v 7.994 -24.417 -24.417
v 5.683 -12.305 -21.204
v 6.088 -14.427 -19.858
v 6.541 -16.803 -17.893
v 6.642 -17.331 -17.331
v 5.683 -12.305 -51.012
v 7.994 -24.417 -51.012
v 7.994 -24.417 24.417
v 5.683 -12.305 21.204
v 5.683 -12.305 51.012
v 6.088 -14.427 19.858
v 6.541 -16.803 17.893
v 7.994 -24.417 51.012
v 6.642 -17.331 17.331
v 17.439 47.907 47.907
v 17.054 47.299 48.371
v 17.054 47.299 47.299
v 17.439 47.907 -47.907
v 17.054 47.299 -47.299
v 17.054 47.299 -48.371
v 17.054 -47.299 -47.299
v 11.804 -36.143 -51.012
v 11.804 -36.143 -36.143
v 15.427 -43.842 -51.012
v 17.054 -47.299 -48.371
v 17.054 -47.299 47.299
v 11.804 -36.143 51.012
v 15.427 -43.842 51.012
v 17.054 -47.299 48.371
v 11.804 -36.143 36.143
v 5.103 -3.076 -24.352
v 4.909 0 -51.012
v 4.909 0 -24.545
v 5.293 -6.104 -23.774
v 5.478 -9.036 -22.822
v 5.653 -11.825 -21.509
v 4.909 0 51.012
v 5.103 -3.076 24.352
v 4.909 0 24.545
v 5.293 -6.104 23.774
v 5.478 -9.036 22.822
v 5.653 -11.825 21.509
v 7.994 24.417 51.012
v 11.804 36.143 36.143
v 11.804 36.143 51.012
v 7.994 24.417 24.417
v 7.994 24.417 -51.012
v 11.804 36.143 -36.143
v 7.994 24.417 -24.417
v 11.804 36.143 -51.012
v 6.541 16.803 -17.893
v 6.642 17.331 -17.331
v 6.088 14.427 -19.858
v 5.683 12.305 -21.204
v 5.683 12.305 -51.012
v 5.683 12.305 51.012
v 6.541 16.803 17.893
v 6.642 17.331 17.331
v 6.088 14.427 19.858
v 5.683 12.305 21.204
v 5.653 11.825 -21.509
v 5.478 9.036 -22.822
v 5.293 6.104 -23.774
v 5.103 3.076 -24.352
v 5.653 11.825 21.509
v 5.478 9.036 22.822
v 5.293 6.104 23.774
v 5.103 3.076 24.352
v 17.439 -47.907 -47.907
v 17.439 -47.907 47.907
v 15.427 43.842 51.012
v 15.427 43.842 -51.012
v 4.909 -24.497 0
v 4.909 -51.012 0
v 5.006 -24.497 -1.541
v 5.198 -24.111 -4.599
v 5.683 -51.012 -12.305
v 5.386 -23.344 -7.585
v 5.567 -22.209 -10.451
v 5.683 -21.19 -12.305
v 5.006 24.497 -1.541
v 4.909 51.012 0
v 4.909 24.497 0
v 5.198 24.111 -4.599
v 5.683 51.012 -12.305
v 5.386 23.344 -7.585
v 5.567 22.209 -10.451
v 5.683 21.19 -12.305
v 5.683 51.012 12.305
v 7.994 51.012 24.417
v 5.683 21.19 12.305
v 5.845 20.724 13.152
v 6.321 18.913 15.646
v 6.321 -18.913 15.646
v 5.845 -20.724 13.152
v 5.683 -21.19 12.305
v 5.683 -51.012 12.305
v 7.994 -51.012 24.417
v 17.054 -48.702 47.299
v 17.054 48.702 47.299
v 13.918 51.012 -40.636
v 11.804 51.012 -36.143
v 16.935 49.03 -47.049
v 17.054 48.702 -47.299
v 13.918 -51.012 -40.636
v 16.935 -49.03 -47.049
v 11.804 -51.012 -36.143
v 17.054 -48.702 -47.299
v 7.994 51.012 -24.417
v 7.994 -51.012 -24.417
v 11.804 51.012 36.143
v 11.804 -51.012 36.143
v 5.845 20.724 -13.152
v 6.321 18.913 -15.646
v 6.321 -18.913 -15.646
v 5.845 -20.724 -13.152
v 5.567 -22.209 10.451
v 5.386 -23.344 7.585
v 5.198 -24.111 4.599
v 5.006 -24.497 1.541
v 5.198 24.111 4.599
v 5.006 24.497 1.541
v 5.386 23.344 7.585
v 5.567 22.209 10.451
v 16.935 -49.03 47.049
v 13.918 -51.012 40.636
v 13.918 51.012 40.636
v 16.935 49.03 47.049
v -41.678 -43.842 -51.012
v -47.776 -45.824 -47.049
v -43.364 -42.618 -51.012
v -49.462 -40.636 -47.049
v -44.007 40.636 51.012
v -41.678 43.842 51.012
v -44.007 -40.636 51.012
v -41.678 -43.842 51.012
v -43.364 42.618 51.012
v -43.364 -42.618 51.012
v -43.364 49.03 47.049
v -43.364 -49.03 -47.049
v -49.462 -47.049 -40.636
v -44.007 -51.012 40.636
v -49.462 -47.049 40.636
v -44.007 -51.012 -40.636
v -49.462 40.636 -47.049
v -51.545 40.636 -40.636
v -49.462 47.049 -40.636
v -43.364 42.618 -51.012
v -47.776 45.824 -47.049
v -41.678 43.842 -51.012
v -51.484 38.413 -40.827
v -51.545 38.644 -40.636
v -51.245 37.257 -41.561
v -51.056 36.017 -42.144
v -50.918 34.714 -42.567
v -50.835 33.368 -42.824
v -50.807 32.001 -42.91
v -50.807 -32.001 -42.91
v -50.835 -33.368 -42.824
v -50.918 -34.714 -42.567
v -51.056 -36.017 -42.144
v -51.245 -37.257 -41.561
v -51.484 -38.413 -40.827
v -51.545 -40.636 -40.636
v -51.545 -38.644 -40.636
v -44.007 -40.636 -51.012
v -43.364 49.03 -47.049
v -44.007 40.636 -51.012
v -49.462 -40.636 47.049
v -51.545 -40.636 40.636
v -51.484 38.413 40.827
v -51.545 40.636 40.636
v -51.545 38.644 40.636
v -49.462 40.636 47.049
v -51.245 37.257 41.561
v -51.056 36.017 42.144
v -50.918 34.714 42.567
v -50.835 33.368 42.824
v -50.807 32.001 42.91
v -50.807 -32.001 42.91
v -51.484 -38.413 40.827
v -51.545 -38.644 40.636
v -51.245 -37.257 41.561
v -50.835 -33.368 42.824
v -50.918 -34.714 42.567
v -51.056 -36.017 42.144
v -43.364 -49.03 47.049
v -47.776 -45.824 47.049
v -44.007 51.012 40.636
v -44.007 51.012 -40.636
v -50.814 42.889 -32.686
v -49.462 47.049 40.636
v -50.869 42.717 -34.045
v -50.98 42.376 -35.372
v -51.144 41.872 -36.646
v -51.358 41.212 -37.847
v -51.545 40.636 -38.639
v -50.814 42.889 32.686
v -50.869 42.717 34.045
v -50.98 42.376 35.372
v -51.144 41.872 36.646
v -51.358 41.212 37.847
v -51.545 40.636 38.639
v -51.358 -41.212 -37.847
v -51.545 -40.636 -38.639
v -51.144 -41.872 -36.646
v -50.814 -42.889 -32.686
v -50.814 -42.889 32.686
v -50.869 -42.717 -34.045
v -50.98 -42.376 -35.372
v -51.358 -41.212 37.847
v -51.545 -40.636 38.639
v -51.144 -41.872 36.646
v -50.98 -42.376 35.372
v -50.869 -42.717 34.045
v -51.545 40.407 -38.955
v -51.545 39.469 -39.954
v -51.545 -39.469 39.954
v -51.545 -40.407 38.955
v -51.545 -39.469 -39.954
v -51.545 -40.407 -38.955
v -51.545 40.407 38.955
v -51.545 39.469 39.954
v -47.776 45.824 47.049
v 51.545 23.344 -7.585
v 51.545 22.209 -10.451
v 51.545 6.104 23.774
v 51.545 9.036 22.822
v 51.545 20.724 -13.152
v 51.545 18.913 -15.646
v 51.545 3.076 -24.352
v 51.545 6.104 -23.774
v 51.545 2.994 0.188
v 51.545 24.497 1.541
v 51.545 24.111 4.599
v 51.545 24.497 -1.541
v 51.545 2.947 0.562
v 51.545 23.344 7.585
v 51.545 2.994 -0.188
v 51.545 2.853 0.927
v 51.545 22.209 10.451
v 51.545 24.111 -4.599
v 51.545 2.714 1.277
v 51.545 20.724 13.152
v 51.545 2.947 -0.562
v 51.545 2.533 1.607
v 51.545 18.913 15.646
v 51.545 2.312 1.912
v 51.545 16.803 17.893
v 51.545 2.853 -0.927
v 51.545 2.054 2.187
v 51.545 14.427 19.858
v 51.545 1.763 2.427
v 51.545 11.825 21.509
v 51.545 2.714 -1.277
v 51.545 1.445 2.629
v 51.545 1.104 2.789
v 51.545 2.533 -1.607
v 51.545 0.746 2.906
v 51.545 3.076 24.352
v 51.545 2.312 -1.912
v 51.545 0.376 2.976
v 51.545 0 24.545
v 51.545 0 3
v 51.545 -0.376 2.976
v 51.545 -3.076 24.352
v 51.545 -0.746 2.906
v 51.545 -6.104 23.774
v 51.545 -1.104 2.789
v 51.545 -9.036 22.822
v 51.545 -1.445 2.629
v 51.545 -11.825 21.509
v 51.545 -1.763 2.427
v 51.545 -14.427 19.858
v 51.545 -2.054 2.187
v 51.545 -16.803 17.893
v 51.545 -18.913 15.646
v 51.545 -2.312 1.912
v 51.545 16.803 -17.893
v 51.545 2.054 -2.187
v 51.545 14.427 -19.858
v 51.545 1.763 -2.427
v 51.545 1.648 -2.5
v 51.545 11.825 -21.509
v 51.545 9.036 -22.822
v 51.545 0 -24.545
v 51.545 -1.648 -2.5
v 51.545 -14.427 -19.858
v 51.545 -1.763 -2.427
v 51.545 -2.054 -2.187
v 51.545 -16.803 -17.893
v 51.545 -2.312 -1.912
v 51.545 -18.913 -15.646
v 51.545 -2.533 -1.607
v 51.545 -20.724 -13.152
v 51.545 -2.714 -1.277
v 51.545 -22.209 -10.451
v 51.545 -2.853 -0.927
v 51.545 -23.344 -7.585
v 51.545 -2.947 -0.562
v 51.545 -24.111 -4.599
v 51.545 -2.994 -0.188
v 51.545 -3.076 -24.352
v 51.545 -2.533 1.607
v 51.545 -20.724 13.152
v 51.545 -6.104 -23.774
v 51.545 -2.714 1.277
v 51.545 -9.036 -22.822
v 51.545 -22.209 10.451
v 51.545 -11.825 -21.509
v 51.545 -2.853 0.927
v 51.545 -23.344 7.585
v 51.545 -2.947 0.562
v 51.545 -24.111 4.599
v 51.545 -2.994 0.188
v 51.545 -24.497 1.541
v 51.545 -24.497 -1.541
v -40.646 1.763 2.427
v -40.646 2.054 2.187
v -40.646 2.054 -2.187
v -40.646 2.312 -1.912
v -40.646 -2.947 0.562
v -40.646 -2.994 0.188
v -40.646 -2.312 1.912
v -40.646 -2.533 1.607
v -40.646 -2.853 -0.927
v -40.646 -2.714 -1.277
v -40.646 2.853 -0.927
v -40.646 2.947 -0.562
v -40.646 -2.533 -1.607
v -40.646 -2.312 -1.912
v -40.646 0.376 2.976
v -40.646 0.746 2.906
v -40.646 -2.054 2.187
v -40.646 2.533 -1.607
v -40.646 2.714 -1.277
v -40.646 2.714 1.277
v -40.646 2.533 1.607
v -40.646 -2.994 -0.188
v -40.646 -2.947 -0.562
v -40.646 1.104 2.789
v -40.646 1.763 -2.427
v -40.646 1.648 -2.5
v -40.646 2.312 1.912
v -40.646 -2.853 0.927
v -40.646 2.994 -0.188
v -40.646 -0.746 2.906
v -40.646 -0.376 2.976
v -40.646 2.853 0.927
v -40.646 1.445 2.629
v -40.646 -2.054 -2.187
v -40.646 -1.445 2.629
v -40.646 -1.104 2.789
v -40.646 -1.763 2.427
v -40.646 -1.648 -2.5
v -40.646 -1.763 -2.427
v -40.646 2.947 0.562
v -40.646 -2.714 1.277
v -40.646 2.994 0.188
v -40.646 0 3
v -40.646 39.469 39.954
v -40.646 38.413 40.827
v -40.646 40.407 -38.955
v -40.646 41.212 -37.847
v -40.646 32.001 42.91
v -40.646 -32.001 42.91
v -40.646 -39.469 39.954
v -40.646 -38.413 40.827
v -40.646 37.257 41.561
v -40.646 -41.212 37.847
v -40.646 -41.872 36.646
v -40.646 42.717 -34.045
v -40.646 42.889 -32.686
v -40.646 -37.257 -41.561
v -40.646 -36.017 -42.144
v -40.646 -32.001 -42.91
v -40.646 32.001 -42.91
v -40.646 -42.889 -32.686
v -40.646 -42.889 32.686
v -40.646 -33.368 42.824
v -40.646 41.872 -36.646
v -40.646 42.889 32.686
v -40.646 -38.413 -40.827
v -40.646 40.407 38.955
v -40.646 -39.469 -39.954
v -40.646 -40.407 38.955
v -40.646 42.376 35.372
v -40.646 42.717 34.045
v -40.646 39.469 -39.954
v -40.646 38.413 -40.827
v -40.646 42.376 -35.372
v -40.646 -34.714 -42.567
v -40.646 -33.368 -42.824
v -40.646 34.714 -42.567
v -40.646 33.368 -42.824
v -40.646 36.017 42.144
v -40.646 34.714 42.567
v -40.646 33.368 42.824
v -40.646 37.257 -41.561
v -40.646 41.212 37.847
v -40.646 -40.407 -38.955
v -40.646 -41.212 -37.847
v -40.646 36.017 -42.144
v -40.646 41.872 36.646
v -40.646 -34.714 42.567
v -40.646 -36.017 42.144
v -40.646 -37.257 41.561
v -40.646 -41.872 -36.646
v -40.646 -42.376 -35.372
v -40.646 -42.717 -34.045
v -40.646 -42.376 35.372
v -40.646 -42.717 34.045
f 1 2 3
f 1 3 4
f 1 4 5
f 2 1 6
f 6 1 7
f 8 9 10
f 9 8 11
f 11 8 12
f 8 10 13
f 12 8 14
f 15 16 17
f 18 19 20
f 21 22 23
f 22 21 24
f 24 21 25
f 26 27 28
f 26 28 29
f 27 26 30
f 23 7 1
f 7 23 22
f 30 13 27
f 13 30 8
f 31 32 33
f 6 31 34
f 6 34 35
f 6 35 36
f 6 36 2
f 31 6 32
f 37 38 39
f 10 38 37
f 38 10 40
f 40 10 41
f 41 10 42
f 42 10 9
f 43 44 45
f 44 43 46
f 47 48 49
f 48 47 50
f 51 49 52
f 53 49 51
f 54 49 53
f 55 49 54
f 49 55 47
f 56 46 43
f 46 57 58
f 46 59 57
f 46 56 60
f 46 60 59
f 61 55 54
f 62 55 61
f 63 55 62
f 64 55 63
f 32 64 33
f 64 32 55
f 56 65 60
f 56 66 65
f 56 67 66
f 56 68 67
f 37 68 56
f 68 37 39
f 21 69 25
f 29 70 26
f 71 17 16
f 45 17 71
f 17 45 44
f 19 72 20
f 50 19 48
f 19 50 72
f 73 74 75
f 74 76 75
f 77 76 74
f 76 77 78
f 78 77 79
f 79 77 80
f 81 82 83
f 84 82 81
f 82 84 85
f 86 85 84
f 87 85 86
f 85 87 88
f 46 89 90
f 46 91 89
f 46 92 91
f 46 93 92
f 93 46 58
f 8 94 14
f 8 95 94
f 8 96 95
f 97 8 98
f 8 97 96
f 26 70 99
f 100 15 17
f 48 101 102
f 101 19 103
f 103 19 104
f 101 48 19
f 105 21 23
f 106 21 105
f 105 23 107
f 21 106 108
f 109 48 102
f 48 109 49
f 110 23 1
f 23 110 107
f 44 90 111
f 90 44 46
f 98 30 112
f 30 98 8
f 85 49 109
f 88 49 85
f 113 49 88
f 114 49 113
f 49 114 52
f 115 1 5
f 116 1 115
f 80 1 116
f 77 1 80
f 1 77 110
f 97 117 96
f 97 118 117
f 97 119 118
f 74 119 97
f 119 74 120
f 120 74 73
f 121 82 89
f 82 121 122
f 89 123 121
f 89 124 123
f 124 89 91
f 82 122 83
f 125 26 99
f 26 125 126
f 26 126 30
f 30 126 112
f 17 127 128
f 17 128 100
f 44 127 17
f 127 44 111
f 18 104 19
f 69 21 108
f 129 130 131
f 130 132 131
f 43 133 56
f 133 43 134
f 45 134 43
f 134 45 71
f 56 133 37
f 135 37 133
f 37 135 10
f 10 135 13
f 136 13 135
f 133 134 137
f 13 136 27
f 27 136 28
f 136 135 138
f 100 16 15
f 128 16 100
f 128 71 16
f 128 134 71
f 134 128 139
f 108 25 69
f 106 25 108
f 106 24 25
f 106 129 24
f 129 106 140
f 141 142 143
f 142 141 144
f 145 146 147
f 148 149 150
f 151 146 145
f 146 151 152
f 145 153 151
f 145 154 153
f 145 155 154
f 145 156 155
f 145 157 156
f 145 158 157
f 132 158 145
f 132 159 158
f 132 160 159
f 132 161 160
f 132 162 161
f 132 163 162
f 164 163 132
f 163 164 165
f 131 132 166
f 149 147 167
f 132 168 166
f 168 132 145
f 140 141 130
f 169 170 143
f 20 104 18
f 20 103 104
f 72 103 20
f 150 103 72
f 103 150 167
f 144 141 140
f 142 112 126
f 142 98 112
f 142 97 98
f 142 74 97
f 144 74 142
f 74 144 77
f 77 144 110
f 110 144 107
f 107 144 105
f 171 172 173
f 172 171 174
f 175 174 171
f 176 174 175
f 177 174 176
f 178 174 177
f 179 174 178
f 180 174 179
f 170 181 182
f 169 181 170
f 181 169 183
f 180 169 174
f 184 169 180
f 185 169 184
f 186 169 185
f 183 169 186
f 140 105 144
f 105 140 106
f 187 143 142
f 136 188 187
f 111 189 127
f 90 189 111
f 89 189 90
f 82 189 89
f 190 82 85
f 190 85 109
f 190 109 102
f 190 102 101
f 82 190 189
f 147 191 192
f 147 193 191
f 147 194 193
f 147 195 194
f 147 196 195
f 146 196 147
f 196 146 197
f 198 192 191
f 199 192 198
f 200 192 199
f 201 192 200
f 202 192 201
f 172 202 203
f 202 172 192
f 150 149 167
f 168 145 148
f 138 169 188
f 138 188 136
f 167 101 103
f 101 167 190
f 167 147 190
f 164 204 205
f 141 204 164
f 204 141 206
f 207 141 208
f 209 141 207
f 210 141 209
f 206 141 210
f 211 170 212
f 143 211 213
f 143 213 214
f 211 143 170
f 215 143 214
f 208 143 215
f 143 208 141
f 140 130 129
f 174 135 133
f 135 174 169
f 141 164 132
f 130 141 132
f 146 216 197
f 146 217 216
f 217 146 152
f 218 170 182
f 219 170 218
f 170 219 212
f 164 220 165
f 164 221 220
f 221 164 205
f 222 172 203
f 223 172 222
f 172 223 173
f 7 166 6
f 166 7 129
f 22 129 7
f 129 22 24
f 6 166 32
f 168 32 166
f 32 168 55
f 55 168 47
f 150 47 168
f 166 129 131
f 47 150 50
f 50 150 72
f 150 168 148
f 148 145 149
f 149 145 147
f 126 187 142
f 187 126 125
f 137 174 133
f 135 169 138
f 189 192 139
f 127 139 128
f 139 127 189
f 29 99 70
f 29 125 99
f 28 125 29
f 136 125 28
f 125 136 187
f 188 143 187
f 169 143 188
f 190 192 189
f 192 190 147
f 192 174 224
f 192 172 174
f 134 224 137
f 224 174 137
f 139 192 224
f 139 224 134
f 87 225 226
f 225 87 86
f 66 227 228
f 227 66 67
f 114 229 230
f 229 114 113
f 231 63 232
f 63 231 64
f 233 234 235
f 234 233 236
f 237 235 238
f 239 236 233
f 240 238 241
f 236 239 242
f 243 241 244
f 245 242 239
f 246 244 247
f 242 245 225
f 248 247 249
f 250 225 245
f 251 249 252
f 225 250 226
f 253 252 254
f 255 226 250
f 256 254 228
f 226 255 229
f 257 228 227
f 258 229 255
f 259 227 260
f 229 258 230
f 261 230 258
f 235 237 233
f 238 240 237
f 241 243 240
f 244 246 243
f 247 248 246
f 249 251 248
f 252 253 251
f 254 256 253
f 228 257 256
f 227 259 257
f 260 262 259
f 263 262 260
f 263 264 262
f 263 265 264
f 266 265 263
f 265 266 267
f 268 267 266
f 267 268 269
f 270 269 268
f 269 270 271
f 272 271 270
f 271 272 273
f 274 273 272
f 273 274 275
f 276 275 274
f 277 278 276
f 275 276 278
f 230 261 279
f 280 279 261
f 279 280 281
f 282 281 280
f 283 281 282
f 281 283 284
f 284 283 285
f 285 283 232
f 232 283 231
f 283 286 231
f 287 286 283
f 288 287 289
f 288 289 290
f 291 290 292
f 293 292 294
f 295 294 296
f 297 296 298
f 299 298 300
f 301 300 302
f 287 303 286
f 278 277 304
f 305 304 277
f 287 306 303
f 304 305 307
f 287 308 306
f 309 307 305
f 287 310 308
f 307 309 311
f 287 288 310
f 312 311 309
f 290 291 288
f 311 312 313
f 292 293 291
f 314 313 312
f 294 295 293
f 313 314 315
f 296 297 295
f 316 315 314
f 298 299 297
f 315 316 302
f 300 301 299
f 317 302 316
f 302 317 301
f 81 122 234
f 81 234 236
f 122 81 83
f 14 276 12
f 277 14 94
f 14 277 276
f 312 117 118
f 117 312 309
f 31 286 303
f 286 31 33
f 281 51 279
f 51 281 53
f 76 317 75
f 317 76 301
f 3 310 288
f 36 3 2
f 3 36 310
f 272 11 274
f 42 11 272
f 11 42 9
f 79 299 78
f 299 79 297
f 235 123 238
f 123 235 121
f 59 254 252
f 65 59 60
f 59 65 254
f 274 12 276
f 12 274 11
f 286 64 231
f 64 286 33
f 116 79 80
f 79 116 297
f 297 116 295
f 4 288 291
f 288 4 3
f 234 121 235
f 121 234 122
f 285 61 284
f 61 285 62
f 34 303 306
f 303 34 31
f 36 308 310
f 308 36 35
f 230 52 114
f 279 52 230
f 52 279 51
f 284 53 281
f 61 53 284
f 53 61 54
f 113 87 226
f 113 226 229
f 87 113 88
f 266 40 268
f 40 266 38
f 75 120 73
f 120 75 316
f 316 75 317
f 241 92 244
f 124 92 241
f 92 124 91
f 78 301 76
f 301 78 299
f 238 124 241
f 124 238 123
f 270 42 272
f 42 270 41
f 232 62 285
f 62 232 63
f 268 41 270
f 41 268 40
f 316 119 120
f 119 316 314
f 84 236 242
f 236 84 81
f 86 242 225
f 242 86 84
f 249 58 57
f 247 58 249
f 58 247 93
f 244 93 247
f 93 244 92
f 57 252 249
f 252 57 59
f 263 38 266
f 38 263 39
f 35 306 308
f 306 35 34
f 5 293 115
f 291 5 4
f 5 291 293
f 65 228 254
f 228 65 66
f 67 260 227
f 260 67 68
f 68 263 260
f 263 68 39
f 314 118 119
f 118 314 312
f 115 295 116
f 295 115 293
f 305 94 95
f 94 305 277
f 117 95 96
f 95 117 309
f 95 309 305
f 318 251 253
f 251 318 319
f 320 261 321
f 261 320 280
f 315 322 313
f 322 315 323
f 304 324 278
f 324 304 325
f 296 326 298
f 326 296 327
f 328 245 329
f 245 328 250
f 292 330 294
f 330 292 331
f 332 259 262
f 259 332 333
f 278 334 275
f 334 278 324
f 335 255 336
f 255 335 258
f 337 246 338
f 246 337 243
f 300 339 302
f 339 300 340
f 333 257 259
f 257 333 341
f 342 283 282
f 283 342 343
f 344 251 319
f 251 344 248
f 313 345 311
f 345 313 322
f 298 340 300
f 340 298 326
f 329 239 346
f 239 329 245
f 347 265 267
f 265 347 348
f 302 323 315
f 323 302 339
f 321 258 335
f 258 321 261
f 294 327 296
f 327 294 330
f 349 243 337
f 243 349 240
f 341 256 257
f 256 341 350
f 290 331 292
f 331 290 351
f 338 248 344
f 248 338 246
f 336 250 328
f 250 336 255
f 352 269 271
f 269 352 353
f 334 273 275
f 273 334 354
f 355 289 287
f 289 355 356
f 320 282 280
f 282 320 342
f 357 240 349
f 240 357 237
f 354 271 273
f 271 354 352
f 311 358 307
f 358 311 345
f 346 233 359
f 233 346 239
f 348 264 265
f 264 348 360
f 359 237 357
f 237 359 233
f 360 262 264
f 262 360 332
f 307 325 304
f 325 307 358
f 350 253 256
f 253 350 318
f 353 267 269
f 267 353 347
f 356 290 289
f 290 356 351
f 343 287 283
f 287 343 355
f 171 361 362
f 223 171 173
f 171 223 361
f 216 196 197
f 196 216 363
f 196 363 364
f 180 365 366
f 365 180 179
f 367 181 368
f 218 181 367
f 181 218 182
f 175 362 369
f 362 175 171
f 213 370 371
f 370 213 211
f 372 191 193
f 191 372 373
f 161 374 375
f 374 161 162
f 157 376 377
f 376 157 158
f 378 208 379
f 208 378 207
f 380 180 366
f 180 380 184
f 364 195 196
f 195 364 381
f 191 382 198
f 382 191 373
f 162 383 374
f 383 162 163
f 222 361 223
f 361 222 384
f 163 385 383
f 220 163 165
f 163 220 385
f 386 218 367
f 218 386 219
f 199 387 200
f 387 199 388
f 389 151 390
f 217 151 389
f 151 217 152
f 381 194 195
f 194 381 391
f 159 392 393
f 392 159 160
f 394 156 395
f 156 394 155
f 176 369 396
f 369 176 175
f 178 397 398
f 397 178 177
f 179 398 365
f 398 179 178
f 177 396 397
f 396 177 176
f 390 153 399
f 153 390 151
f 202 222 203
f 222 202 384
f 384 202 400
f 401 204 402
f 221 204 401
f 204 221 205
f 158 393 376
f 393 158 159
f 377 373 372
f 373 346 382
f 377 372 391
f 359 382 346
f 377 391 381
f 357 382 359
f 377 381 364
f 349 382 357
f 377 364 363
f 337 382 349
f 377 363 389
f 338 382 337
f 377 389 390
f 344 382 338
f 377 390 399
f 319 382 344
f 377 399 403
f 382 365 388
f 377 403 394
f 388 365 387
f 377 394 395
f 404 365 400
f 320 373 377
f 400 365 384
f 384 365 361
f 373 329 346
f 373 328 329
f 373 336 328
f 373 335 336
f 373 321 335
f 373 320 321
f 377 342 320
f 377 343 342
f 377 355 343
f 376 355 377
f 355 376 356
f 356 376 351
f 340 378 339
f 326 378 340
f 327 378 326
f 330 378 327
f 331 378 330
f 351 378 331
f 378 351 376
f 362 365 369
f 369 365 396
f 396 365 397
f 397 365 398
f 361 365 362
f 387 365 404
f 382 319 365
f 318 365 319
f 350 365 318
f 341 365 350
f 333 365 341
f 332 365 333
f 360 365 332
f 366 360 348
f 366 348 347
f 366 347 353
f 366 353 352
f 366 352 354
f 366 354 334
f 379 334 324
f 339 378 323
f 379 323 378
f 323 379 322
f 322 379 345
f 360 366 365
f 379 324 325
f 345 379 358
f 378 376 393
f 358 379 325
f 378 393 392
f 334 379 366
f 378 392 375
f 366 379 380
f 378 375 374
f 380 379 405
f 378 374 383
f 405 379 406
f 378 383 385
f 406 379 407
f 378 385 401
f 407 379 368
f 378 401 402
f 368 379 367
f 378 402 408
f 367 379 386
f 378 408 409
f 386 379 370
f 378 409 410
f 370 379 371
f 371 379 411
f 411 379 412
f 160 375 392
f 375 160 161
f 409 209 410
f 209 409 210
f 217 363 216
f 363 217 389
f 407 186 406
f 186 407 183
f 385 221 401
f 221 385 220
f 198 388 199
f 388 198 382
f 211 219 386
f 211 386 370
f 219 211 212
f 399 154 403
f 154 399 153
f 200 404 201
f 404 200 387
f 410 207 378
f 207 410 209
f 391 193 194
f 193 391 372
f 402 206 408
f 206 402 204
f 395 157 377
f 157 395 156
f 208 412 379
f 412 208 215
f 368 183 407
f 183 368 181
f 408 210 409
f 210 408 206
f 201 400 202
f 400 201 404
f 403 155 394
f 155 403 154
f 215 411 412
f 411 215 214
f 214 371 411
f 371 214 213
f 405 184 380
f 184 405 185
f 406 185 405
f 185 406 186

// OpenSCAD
// file: variables.scad
$fn=50;

scale_factor = 300/55;

CUBIE=18.9*scale_factor; //total side length of each cube piece (including rounded edges)
CORE=18*scale_factor;
SCREW_TIP=1.5*scale_factor;
SCREW_BODY=2*scale_factor;
SCREW_HEAD=3.8*scale_factor;
INNER=4.5*scale_factor;
SPRING=3.2*scale_factor;
ROUND=2*scale_factor; //radius of rounded edges
DEPTH=6*scale_factor;
RAFT=5*scale_factor;
LAYER=0.3*scale_factor;
GAP=0.25*scale_factor;

core_height = 20 * scale_factor;
core_radius = 3 * scale_factor;

WITH_SUPPORT=false;
WITH_RAFT=false;

inner_cubie=(CUBIE-2*ROUND); //length of each cube before rounded edges

tile_length = inner_cubie*0.75;
tile_height = 1 * scale_factor;

module tile(length, height) {
	translate([-length/2,-length/2,0]) {
		minkowski(){
			translate([0,0,-height/2]) cube([length,length,height]);
			cylinder(r=ROUND,h=height,center=true);
		}
	}
	
}

module cubie() {
    translate([-inner_cubie/2,-inner_cubie/2, -inner_cubie/2])
    minkowski() {
        cube([inner_cubie, inner_cubie, inner_cubie]);
        sphere(r=ROUND, $fn=10);
    }
}

module disc() {
    cylinder(CUBIE, r1=CORE, r2=CORE, $fn=50, center=true);

}

module disc2() {
    cylinder(CUBIE*10, r1=CORE, r2=CORE, $fn=50, center=true);

}

module icore() {
    disc();
    rotate([0,90,0])
        disc();
    rotate([90,0,0])
        disc();
}

module core2() {
    intersection() {
        disc2();
        rotate([0,90,0])
            disc2();
        rotate([90,0,0])
            disc2();
    }
}

module screw() {
    translate([5.2,0,0])
    rotate([0,90,0]) {
        cylinder(11.7,r1=SCREW_BODY,r2=SCREW_BODY,$fn=10,center=true);
        translate([0,0,-11.7/2-1.7/2])
            cylinder(1.7,r1=SCREW_HEAD,r2=SCREW_HEAD,$fn=10,center=true);
        translate([0,0,11.7/2+5.7/2])
            cylinder(5.7,r1=SCREW_TIP,r2=SCREW_TIP,$fn=10,center=true);
    }
}
// main file
include <variables.scad>


module center() 
{
	difference() {
    	difference() 
	    {
	        union() 
	        {
	            difference() {
                
                    difference() 
                    {
                        cubie();
                        translate([CUBIE,0,0])
                            icore();
        
                    }
                    
                    
                    /*translate([0,0,0])
                    scale([0.8,0.8,0.8])
                    difference() 
                    {
                        cubie();
                        translate([CUBIE,0,0])
                            icore();
        
                    }*/
                }                
                
	            rotate([0,90,0])
	                cylinder(CUBIE,r1=INNER,r2=INNER,center=true);
	            if (WITH_RAFT)
	                raft();
	        }
	
	        rotate([0,90,0]) 
	        {
                difference() {
                    cylinder(CUBIE+0.5,r=3,center=true);
                    translate([3-0.5+2.5,0,0]) cube([5,8,CUBIE+0.5],center=true);
                }
                /*union() 
	            {
	                cylinder(CUBIE+0.5,r1=SCREW_BODY+GAP,r2=SCREW_BODY+GAP,center=true);
	
	                translate([0,0,CUBIE/2-1/2-3])
	                    cylinder(1.5,r1=SPRING+GAP,r2=SCREW_BODY+GAP,center=true);
	
	
	                translate([0,0,CUBIE/2-1/2-9.5])
	                    cylinder(1,r1=SCREW_HEAD+GAP,r2=SPRING+GAP,center=true);
	
	
	                translate([0,0,-4.25/2])
	                    cylinder(CUBIE-4.25,r1=SPRING+GAP,r2=SPRING+GAP,center=true);
	
	                translate([0,0,-10.5/2])
	                    cylinder(CUBIE-10,r1=SCREW_HEAD+GAP,r2=SCREW_HEAD+GAP,center=true); 
	            }*/
	        }
	    }
		translate([-CUBIE/2 + tile_height-0.01,0])
		rotate(v=[0,1,0], a=90)
		tile(tile_length*1.05, tile_height);		
	}
}
center();
